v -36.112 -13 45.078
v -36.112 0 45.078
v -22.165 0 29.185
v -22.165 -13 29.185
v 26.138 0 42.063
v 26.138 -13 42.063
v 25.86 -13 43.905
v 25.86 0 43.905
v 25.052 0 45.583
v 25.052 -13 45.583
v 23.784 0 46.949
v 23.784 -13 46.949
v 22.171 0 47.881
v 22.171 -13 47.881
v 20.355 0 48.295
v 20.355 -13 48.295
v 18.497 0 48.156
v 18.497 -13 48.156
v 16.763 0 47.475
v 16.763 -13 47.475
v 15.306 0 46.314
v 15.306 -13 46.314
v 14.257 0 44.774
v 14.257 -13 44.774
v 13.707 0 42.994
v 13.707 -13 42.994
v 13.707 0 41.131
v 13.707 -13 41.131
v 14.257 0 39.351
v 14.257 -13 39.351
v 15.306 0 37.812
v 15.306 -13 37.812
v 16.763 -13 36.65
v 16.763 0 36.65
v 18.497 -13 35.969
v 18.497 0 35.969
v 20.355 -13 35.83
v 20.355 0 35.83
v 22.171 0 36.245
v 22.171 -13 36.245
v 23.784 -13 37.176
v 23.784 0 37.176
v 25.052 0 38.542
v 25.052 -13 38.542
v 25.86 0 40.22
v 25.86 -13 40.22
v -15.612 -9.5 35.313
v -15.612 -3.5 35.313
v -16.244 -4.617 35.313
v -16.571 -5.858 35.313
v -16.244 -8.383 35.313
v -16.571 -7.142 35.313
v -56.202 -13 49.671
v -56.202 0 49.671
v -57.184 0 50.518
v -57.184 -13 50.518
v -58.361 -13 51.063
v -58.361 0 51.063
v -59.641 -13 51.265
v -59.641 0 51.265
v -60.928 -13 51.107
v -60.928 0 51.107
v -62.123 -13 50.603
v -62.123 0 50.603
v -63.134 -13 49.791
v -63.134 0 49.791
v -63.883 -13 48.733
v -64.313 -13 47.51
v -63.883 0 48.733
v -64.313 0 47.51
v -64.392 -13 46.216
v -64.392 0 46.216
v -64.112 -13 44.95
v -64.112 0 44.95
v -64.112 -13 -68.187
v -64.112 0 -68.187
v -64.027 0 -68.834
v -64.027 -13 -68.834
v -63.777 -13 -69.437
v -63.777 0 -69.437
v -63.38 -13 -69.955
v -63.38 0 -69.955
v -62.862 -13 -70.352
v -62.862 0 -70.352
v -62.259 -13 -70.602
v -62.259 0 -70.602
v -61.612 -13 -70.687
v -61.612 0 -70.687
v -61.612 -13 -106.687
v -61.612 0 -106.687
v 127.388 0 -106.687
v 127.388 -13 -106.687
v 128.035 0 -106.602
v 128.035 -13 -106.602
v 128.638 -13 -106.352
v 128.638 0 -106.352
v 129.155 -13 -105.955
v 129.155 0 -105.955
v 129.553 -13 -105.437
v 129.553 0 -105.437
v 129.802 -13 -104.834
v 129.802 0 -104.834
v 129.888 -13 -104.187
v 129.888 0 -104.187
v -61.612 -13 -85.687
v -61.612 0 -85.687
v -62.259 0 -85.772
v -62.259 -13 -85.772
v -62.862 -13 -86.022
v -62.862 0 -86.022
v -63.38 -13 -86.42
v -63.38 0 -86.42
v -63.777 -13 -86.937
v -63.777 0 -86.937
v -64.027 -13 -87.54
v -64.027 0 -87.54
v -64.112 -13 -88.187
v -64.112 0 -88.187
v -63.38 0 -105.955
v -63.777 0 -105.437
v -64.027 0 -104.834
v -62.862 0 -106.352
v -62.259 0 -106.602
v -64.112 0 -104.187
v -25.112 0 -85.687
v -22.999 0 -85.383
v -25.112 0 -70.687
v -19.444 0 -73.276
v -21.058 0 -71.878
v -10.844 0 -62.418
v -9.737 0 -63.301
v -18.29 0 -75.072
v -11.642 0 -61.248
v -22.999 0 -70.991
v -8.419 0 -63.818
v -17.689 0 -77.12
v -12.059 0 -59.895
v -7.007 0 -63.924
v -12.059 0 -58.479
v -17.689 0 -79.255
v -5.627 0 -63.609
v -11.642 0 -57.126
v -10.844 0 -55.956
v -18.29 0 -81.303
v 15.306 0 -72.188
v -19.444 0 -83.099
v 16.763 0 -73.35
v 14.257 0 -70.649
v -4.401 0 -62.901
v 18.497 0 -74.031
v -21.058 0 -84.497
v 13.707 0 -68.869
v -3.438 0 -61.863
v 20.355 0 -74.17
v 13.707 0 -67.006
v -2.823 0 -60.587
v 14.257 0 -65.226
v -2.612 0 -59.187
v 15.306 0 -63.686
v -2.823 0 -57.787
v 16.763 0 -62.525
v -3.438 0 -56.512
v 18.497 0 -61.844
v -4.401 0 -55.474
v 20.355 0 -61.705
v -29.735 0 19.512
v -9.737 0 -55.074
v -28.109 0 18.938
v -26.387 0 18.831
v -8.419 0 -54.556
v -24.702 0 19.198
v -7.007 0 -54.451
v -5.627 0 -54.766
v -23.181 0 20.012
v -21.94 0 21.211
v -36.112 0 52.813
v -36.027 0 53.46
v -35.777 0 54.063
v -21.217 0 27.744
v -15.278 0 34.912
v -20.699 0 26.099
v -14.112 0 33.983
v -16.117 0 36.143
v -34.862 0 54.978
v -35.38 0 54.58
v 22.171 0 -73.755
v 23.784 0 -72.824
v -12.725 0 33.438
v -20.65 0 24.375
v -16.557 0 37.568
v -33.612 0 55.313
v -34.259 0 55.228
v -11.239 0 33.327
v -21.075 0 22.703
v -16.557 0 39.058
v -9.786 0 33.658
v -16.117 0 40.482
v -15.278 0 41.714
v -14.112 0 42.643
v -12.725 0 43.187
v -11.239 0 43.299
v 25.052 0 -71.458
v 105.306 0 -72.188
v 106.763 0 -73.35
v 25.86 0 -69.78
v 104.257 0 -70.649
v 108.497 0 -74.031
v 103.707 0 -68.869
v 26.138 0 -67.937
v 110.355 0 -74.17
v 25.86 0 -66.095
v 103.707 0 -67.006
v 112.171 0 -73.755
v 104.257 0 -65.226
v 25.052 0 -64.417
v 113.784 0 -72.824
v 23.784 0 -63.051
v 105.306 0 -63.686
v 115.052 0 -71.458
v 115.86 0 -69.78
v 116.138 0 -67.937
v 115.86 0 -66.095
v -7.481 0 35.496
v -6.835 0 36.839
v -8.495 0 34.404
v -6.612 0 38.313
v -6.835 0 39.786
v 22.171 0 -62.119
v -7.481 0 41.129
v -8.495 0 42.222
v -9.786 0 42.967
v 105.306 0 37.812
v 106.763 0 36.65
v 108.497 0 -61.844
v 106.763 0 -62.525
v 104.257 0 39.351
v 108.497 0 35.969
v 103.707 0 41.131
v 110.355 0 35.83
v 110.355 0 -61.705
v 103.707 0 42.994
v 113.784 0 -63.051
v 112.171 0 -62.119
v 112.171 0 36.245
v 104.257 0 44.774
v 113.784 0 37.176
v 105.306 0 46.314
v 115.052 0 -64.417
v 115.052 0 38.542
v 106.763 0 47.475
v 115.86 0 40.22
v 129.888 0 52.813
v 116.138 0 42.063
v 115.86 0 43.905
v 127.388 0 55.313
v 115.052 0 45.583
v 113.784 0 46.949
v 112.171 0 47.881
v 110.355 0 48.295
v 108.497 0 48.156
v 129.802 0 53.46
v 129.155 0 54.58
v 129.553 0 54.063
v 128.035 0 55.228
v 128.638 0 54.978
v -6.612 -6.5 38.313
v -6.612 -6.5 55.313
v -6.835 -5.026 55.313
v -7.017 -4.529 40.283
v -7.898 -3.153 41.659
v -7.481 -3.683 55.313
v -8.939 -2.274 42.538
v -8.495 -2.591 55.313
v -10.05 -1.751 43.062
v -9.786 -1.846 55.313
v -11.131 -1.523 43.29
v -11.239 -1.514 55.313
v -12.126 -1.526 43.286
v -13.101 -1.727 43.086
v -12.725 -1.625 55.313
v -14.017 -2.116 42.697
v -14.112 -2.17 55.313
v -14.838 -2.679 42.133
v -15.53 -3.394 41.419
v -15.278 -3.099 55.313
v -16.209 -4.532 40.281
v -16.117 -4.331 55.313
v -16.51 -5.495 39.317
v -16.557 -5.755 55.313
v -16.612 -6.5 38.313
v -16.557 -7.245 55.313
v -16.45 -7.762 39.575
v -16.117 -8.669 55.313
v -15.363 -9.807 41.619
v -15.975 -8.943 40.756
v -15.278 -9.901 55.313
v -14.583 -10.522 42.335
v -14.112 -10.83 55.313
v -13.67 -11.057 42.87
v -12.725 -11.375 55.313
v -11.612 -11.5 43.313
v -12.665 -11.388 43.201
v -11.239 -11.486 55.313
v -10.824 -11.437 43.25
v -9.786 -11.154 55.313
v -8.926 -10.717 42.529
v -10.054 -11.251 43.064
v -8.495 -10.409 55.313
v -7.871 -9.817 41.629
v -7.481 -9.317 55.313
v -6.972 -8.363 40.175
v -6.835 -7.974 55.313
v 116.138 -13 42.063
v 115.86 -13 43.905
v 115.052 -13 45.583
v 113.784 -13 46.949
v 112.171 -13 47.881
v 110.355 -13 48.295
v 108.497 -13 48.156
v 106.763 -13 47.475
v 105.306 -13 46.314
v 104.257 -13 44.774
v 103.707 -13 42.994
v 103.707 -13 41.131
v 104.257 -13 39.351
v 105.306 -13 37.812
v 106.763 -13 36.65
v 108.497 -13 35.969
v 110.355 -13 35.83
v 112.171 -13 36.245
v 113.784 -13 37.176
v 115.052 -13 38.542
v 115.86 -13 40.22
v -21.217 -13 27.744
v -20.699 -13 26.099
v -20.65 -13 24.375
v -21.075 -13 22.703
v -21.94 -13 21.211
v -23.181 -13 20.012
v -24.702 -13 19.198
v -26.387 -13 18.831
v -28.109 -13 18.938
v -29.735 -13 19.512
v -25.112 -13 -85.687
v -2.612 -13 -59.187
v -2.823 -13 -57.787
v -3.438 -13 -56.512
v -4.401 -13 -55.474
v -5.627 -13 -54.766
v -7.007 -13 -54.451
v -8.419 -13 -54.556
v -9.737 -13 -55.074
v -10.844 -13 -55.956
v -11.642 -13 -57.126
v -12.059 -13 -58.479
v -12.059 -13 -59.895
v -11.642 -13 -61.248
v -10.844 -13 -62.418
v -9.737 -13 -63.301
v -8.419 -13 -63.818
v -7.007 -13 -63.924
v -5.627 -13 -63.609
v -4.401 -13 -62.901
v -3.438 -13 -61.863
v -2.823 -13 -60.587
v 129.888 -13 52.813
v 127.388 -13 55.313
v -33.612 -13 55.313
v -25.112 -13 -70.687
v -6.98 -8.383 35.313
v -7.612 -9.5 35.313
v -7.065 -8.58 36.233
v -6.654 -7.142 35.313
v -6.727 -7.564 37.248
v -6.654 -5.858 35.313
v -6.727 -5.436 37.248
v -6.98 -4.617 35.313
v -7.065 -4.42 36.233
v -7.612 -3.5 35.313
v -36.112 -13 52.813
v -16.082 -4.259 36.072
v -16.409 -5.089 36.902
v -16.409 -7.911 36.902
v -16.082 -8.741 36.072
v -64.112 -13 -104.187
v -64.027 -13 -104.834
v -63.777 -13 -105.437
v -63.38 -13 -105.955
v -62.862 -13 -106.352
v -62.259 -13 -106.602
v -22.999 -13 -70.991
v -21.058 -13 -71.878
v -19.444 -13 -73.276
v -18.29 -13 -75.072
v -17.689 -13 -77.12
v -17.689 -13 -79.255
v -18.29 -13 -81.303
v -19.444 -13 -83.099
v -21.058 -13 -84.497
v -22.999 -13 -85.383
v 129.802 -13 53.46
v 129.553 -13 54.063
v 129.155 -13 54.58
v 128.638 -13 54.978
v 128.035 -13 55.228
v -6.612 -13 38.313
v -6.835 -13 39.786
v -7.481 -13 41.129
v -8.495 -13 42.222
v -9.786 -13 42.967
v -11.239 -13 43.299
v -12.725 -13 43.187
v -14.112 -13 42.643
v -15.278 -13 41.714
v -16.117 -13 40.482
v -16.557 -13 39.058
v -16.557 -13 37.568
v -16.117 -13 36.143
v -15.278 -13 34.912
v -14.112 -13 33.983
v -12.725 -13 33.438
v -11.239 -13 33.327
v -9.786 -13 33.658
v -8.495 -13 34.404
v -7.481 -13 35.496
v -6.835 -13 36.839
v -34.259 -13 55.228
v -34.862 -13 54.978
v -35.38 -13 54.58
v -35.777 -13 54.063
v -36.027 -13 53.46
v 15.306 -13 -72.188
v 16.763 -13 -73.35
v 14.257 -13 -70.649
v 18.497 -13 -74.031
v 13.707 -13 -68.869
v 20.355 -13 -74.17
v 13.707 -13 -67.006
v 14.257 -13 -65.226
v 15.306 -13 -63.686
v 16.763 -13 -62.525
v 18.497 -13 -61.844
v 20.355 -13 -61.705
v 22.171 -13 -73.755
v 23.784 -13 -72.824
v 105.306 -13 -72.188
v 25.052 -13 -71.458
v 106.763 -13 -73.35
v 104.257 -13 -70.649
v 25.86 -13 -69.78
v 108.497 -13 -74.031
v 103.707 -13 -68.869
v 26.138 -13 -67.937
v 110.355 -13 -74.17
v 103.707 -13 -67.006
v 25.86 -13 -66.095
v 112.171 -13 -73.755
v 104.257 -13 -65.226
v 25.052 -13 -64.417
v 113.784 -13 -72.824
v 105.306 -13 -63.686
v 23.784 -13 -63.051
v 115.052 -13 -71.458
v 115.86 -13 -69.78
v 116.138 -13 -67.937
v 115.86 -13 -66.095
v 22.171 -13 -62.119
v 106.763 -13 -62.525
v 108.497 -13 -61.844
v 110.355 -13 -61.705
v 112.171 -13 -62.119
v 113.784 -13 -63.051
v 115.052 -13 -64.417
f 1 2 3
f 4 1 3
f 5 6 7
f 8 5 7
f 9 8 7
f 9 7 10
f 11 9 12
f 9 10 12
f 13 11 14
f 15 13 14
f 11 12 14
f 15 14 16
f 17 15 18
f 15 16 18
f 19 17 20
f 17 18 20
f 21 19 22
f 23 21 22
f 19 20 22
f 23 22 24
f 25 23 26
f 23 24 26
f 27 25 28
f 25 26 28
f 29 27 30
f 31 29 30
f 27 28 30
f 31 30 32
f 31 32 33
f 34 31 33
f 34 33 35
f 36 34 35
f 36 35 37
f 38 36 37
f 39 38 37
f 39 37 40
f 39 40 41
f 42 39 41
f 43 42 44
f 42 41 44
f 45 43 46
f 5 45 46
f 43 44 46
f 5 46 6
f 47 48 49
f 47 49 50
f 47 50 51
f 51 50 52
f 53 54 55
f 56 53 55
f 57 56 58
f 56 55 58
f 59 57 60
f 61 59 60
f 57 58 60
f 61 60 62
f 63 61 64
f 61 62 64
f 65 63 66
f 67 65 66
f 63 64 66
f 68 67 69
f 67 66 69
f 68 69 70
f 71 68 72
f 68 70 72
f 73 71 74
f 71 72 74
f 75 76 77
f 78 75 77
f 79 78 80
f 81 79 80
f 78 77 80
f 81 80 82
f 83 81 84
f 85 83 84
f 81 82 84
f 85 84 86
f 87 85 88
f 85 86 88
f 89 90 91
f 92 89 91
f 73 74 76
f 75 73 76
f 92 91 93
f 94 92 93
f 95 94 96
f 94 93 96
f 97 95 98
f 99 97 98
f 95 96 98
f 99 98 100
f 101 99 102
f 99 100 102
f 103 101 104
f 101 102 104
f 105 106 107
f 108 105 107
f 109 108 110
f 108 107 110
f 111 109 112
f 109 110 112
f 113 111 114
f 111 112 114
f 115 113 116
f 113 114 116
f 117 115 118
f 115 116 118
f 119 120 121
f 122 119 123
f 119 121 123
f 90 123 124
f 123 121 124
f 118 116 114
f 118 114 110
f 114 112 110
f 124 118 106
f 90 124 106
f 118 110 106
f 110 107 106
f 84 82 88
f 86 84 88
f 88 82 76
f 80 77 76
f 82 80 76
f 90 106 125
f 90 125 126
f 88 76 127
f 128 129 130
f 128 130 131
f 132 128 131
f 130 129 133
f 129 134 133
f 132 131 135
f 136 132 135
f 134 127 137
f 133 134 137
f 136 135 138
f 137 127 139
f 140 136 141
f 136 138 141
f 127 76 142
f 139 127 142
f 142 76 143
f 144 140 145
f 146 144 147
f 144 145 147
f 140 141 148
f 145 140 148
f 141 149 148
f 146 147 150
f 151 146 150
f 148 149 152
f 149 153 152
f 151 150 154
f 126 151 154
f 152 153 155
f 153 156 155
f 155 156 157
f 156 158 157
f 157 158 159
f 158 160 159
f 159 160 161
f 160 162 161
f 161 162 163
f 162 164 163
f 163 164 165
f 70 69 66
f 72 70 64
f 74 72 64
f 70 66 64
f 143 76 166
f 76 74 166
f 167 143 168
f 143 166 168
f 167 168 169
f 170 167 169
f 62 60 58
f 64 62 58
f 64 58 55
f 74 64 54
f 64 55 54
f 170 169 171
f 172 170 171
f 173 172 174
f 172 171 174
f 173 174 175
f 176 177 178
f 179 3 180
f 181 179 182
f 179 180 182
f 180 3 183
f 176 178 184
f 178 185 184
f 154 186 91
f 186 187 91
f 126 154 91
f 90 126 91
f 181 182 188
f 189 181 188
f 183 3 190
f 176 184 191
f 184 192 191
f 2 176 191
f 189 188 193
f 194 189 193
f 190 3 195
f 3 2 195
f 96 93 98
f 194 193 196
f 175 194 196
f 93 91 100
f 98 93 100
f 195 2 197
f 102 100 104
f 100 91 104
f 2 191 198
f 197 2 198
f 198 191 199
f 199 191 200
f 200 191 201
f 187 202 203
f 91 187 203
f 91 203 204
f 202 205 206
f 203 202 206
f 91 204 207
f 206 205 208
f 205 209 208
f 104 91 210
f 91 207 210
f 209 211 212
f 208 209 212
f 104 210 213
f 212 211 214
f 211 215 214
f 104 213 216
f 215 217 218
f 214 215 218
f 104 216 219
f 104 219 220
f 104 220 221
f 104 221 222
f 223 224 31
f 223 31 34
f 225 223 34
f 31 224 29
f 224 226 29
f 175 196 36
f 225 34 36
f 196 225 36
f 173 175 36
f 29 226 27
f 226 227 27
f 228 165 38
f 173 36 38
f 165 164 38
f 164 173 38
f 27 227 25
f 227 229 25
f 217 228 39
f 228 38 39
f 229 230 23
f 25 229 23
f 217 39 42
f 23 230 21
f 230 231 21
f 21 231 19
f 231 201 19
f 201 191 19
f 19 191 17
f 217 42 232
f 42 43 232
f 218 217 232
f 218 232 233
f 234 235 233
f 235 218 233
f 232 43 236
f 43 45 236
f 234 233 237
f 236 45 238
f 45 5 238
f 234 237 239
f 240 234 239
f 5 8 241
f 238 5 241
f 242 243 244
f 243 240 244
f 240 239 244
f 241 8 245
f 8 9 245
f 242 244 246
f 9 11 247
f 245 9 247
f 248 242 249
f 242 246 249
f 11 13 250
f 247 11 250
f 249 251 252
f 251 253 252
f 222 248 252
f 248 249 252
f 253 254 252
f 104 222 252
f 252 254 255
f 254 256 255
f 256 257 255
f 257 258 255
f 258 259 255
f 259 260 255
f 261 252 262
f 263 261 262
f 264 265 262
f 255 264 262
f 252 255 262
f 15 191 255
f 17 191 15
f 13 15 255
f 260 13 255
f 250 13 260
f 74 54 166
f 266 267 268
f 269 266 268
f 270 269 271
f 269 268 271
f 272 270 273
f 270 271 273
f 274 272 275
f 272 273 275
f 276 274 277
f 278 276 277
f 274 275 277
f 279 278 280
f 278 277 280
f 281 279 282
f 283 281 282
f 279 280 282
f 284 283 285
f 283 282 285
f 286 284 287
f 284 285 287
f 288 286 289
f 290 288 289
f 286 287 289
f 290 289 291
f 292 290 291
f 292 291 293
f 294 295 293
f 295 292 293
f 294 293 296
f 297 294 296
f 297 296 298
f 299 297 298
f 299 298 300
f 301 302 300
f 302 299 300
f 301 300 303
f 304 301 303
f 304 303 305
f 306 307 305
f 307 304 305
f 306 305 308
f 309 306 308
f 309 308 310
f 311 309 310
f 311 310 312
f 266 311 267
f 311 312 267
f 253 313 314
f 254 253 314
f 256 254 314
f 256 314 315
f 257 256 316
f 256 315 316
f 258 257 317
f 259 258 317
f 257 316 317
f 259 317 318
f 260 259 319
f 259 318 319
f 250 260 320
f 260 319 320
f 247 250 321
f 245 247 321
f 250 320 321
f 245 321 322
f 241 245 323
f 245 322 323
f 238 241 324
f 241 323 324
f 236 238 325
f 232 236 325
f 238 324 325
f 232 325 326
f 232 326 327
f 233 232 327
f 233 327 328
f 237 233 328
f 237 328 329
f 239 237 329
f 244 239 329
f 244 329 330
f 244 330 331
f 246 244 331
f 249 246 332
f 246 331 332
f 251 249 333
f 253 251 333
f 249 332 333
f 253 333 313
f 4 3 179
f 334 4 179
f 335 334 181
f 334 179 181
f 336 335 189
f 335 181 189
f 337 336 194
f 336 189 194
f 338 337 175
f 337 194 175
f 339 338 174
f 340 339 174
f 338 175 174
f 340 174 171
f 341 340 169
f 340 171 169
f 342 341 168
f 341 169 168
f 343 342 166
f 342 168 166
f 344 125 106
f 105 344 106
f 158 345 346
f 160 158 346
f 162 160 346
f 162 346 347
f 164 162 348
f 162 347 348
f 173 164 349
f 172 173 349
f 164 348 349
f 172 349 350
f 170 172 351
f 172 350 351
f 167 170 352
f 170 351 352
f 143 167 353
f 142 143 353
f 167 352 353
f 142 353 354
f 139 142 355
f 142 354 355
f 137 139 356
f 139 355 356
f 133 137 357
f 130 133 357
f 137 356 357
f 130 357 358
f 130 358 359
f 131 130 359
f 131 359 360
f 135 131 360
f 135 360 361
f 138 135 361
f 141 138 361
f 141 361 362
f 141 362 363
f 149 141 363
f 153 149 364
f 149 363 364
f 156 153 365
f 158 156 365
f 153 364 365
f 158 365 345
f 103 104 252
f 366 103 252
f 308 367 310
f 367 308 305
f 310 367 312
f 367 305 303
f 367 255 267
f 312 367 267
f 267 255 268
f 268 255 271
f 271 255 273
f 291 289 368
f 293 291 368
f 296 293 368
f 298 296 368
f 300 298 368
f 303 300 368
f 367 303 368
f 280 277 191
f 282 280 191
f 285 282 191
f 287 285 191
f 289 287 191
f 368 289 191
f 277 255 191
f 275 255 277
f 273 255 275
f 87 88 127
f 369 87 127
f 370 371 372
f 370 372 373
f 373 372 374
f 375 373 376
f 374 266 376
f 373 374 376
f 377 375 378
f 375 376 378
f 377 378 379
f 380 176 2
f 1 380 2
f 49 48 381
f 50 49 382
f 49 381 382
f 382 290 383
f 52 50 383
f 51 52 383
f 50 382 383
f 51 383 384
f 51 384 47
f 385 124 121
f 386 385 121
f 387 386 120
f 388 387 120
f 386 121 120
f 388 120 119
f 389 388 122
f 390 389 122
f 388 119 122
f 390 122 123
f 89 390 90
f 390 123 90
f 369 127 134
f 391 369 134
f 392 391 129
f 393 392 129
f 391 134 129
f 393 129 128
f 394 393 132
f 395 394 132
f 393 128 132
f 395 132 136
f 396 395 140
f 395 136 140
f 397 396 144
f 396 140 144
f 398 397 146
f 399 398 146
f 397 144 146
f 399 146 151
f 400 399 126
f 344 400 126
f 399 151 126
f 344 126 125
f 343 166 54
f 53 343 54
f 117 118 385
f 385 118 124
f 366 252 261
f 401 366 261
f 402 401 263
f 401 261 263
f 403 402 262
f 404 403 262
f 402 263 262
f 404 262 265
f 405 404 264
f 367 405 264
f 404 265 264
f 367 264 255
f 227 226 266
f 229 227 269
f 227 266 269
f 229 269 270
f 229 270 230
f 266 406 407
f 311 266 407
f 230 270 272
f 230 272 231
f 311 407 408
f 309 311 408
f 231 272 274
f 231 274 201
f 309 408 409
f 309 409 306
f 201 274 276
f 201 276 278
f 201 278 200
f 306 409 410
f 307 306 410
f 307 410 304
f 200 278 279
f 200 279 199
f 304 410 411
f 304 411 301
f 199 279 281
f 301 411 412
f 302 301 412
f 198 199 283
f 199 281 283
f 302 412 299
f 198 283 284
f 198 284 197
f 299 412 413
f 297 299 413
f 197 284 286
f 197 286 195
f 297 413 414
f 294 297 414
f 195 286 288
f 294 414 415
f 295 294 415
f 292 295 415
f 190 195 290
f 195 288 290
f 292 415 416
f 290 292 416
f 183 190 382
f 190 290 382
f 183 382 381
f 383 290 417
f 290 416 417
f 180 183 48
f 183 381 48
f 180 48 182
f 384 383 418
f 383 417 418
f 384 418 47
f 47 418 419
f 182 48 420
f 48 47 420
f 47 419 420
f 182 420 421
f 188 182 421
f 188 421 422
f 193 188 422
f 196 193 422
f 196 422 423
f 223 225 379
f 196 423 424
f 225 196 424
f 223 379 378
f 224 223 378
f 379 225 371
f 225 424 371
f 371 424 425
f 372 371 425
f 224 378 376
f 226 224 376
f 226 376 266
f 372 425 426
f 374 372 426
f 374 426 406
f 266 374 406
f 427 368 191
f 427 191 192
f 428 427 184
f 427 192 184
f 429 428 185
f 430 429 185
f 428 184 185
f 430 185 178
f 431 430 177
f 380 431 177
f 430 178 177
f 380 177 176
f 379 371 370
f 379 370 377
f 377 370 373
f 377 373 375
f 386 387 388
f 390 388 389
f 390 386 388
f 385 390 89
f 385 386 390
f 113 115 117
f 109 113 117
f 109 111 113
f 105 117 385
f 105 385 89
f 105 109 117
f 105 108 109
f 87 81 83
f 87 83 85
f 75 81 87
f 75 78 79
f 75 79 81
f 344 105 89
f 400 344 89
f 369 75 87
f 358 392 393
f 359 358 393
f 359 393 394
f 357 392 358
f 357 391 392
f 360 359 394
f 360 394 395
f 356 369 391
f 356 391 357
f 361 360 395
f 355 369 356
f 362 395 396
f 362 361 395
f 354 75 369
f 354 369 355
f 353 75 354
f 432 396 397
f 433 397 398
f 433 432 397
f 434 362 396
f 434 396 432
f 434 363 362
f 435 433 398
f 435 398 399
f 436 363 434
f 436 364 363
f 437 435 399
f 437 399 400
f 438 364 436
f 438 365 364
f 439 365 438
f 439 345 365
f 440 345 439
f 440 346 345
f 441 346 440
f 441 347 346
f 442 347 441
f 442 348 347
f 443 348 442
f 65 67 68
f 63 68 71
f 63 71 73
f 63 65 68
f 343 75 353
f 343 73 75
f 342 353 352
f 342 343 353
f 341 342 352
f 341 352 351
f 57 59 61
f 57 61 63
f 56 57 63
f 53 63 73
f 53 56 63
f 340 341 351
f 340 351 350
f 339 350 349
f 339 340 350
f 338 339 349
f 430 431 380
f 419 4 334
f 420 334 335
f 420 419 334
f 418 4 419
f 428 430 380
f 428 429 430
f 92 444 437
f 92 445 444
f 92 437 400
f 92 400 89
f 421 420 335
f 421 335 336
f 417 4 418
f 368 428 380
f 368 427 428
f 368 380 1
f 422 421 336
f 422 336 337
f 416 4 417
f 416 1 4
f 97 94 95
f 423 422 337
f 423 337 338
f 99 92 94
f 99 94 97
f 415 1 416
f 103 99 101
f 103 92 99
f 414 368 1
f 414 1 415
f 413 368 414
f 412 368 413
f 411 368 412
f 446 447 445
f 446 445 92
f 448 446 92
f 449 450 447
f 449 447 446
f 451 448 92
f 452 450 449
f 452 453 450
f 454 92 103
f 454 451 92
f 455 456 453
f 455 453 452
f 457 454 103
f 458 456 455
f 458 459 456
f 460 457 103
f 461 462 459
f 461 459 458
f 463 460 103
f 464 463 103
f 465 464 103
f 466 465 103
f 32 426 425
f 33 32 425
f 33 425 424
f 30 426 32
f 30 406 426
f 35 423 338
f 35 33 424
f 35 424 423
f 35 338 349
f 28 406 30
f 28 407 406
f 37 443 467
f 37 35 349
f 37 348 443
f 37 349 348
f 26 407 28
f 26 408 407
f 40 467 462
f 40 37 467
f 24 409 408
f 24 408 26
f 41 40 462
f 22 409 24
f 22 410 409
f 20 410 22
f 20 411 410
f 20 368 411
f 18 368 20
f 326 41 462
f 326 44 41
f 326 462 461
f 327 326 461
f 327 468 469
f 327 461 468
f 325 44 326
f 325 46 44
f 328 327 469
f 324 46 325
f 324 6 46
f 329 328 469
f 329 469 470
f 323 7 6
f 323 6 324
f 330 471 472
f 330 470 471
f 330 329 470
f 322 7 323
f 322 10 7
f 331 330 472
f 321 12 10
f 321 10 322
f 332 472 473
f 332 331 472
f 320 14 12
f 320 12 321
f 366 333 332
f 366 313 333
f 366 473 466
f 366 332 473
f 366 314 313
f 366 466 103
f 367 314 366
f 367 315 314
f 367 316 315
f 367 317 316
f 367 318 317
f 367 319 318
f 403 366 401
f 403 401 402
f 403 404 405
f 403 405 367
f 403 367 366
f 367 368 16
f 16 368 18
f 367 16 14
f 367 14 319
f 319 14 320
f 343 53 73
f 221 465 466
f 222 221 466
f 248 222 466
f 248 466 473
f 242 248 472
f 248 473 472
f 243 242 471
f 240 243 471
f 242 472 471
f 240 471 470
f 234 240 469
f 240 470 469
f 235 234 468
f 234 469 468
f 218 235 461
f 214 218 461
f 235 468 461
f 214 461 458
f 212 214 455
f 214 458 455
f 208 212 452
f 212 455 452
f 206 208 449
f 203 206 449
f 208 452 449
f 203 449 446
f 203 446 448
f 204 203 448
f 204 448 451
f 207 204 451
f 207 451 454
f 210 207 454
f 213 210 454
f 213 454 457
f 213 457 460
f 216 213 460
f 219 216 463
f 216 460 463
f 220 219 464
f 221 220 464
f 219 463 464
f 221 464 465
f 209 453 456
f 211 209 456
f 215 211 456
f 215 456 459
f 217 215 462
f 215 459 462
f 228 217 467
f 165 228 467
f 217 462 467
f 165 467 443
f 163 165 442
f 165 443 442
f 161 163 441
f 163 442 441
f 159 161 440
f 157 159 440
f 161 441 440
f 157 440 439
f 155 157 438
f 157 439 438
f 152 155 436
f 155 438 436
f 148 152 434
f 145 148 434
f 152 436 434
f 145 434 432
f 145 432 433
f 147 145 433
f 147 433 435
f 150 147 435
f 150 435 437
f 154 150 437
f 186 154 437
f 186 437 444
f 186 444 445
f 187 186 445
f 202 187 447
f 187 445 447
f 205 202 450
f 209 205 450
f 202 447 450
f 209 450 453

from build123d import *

# Parameters (mm, degrees)
F1_DEPTH = 13
F2_R     = 5
F2_R_2   = 6.25
F2_R_3   = 4.75
F3_DEPTH = 13
F4_R     = 5
F5_DEPTH = 20


with BuildPart() as f1:
    # F0 (on Front) → F1 (new body)
    with BuildSketch(Plane.XZ):
        with BuildLine():
            Line((-64.112372, -88.187284), (-64.112372, -104.187284))
            ThreePointArc((-64.112372, -104.187284), (-63.380139, -105.955051), (-61.612372, -106.687284))
            Line((-61.612372, -106.687284), (127.387628, -106.687284))
            ThreePointArc((127.387628, -106.687284), (129.155395, -105.955051), (129.887628, -104.187284))
            Line((129.887628, -104.187284), (129.887628, 52.812716))
            ThreePointArc((129.887628, 52.812716), (129.155395, 54.580483), (127.387628, 55.312716))
            Line((127.387628, 55.312716), (-33.612372, 55.312716))
            ThreePointArc((-33.612372, 55.312716), (-35.380139, 54.580483), (-36.112372, 52.812716))
            Line((-36.112372, 52.812716), (-36.112372, 45.078386))
            Line((-36.112372, 45.078386), (-22.16479, 29.185242))
            ThreePointArc((-22.16479, 29.185242), (-21.940482, 21.210769), (-29.735159, 19.512077))
            Line((-29.735159, 19.512077), (-56.202239, 49.671077))
            ThreePointArc((-56.202239, 49.671077), (-62.122946, 50.60339), (-64.112372, 44.949527))
            Line((-64.112372, 44.949527), (-64.112372, -36.543813))
            Line((-64.112372, -36.543813), (-64.112372, -68.187284))
            ThreePointArc((-64.112372, -68.187284), (-63.380139, -69.955051), (-61.612372, -70.687284))
            Line((-61.612372, -70.687284), (-53.58046, -70.687284))
            Line((-53.58046, -70.687284), (-25.112372, -70.687284))
            ThreePointArc((-25.112372, -70.687284), (-17.612372, -78.187284), (-25.112372, -85.687284))
            Line((-25.112372, -85.687284), (-61.612372, -85.687284))
            ThreePointArc((-61.612372, -85.687284), (-63.380139, -86.419517), (-64.112372, -88.187284))
        make_face()
    extrude(amount=F1_DEPTH)

    # F2 (on face) → F3 (cut)
    with BuildSketch(Plane.XZ.offset(13)):
        with Locations((-11.612372, 38.312716)):
            Circle(F2_R)
        with Locations((19.887628, 42.062716)):
            Circle(F2_R_2)
        with Locations((109.887628, 42.062716)):
            Circle(F2_R_2)
        with Locations((109.887628, -67.937284)):
            Circle(F2_R_2)
        with Locations((19.887628, -67.937284)):
            Circle(F2_R_2)
        with Locations((-7.362372, -59.187284)):
            Circle(F2_R_3)
    extrude(amount=-F3_DEPTH, mode=Mode.SUBTRACT)

    # F4 (on face) → F5 (cut)
    with BuildSketch(Plane.XY.offset(55.312716)):
        with Locations((-11.612372, -6.5)):
            Circle(F4_R)
    extrude(amount=-F5_DEPTH, mode=Mode.SUBTRACT)


solid = f1.part
